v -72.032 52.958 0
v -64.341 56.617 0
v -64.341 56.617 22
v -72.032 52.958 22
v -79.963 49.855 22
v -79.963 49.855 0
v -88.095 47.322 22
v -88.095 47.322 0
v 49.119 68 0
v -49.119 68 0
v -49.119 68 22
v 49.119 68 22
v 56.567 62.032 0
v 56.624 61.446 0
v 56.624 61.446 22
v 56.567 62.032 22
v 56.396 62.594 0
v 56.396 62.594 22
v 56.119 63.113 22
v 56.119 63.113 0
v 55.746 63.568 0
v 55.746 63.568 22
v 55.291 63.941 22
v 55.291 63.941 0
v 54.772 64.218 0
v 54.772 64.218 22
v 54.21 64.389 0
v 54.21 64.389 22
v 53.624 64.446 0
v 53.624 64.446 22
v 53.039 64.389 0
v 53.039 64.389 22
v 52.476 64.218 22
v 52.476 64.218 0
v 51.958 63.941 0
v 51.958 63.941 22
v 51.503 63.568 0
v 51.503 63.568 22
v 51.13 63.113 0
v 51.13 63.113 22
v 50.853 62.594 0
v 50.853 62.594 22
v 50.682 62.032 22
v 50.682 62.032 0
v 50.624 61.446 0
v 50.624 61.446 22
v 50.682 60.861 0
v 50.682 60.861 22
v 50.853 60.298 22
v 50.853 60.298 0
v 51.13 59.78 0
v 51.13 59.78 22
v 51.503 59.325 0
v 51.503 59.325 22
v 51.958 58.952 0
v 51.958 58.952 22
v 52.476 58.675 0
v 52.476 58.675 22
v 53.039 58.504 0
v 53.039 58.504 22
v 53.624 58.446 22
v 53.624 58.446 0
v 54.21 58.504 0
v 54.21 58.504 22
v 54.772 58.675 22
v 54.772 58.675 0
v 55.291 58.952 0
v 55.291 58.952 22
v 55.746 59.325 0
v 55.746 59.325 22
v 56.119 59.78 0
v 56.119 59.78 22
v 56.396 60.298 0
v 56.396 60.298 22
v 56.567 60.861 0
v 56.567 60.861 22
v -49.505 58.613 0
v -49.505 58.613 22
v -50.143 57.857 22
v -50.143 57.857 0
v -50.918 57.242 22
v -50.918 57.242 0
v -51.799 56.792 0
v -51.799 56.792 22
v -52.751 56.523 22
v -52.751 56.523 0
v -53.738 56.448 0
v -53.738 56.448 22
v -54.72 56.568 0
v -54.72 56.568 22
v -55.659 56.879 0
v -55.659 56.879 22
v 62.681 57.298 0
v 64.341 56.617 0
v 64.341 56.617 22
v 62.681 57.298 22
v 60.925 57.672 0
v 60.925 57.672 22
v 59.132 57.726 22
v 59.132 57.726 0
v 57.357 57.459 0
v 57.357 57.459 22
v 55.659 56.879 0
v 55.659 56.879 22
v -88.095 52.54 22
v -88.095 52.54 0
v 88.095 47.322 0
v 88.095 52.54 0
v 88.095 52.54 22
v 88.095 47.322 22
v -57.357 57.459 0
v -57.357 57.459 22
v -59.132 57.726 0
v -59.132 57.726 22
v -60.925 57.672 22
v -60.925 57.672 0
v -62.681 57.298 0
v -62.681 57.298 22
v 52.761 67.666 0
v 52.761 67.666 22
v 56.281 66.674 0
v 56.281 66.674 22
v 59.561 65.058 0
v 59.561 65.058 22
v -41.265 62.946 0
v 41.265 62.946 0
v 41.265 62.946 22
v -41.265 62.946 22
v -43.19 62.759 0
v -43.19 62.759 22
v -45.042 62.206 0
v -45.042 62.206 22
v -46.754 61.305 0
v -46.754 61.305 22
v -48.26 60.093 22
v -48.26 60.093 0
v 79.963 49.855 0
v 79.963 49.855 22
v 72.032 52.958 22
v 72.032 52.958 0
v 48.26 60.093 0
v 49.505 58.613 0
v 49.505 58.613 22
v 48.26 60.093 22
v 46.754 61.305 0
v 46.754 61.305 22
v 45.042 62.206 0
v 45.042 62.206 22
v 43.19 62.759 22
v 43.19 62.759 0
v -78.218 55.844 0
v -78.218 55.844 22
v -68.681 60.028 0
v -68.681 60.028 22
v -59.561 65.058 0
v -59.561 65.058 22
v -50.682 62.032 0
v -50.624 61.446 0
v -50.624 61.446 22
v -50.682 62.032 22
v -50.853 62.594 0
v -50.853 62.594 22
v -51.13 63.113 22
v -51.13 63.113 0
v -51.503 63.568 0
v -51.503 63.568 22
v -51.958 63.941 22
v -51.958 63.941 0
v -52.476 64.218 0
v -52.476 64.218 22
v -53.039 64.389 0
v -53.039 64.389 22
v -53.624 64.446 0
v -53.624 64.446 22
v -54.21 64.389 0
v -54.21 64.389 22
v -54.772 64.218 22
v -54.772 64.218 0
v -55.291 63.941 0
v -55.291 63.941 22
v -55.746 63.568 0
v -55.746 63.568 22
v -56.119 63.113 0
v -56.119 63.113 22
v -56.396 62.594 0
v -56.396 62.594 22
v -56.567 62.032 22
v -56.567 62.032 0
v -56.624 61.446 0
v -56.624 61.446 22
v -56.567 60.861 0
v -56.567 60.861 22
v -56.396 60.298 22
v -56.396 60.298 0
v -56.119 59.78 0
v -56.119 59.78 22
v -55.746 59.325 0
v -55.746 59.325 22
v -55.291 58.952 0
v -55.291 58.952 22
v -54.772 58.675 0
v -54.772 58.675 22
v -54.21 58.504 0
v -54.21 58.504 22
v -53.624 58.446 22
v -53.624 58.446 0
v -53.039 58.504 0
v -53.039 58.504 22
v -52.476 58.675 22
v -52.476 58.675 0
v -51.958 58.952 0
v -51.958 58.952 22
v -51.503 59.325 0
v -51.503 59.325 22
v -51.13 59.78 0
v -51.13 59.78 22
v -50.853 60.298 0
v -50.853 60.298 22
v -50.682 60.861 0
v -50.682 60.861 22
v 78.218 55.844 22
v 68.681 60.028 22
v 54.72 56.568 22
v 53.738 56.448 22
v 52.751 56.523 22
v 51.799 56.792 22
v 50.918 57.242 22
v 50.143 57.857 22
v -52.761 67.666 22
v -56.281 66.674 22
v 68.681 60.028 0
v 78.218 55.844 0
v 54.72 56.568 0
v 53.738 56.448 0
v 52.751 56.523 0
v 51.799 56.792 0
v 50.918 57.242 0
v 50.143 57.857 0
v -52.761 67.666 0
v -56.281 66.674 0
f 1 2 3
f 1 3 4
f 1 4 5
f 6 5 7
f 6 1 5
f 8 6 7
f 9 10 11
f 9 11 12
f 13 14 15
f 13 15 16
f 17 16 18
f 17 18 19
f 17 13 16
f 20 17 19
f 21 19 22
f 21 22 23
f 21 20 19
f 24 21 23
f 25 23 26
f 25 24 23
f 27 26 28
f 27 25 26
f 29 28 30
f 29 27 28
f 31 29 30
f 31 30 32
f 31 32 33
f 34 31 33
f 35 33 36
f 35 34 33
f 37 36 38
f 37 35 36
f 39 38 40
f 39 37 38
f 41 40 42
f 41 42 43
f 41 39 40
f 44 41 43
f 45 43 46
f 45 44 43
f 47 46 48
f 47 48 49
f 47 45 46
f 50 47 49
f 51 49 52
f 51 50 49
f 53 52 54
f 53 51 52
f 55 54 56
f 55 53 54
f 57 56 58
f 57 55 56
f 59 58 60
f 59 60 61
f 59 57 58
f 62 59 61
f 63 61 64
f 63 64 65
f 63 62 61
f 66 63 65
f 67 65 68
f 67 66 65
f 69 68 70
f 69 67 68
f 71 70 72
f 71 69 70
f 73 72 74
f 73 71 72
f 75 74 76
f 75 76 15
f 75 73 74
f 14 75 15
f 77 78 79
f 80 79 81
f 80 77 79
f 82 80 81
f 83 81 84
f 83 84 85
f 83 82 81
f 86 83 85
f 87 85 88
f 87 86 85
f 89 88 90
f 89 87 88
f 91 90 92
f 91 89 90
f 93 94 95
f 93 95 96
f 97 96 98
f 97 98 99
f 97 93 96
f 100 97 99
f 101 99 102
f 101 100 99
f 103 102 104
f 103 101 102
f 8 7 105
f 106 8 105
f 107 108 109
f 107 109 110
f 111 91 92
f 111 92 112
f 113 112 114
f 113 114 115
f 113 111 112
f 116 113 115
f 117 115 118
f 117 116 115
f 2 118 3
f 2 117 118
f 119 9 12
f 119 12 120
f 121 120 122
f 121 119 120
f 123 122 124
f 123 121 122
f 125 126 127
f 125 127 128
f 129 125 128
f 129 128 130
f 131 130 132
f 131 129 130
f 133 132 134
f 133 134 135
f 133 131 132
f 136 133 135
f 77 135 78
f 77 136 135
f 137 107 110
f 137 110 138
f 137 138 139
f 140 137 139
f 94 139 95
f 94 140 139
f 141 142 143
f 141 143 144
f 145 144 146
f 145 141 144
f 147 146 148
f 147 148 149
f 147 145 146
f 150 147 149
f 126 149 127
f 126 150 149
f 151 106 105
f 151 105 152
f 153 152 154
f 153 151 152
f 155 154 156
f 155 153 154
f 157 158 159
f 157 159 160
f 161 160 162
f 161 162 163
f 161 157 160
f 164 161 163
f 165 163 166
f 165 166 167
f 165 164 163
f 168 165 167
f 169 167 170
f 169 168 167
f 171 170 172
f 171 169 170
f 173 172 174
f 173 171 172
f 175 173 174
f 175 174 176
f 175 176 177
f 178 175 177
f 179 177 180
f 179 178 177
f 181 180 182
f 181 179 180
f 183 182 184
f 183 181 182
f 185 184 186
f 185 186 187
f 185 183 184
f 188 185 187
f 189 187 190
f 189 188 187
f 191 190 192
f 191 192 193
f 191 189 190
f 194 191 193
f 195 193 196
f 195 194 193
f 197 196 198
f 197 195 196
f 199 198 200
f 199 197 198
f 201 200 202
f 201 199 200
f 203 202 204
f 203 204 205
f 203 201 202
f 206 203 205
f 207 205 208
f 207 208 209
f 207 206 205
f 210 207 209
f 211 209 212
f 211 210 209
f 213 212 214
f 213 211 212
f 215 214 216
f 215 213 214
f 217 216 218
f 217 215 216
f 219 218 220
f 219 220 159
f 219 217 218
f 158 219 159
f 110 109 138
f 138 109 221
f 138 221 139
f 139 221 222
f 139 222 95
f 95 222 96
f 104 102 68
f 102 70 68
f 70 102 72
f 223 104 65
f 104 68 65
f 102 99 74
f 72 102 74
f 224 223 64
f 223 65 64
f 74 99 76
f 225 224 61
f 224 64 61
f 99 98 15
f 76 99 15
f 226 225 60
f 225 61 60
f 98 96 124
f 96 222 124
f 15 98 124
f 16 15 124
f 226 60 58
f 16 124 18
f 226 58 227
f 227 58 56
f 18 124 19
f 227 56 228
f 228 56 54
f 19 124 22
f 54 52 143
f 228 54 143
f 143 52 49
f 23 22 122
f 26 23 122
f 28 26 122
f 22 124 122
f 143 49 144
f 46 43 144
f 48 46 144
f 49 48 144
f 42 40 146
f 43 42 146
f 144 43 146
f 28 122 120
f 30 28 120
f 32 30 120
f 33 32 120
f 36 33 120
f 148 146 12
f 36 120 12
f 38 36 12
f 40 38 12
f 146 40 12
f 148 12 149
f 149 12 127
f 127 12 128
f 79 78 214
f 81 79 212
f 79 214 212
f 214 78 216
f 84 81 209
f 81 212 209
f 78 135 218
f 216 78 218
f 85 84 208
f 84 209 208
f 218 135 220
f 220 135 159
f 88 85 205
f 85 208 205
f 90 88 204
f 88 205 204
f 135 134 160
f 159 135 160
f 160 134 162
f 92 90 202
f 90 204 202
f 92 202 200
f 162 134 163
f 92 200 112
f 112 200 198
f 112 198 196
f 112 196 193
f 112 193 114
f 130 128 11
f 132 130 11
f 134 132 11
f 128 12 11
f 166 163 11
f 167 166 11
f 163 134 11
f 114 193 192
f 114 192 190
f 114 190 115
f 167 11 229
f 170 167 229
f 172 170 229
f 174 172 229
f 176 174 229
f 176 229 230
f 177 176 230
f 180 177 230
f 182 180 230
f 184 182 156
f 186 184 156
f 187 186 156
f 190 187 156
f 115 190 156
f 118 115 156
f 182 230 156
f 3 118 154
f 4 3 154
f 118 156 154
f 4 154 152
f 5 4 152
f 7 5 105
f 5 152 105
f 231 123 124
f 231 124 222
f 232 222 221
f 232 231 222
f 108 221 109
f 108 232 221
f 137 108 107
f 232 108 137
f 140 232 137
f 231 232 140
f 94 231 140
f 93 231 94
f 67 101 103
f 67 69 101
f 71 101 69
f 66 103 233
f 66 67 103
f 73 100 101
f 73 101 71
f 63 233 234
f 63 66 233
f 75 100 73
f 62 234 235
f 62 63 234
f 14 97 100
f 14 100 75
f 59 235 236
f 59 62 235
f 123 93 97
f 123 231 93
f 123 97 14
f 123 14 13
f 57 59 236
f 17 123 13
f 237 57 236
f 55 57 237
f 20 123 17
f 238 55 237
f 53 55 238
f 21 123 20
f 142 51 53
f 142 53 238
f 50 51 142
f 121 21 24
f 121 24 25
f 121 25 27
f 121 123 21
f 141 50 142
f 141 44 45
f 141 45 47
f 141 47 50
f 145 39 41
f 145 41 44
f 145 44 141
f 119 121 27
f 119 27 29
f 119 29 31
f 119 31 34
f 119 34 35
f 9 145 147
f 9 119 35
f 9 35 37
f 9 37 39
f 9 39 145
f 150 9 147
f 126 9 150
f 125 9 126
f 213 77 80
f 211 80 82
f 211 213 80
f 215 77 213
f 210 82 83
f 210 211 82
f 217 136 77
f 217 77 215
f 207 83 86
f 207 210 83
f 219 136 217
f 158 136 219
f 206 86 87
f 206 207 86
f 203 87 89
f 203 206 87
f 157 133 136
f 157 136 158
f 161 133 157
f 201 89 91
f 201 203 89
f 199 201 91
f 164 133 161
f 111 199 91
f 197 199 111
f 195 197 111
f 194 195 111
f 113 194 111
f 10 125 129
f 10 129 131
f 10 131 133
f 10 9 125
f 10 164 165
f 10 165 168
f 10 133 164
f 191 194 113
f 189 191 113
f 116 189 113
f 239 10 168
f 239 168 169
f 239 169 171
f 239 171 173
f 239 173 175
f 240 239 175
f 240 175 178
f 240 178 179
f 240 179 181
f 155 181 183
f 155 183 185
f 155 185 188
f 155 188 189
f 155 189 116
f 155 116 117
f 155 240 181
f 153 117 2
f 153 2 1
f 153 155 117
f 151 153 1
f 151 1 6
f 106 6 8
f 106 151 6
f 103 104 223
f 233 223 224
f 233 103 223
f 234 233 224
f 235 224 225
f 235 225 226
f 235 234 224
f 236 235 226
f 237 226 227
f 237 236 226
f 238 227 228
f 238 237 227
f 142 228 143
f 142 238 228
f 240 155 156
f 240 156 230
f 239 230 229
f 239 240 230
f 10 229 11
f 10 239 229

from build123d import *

# Parameters (mm, degrees)
ESBO_O1_R                = 3
RESSALTO_EXTRUS_O1_DEPTH = 22


with BuildPart() as part:
    # Esboço1 → Ressalto-extrusão1 (new body)
    with BuildSketch(Plane.XY):
        with BuildLine():
            Line((-49.119135606, 68), (49.119135606, 68))
            ThreePointArc((49.119135606, 68), (54.543435225, 67.250375935), (59.56111629, 65.057697365))
            ThreePointArc((59.56111629, 65.057697365), (73.40190502, 57.827992781), (88.094517748, 52.539969306))
            Line((88.094517748, 52.539969306), (88.094517748, 47.321908149))
            ThreePointArc((88.094517748, 47.321908149), (75.969961031, 51.336342949), (64.340736461, 56.616655277))
            ThreePointArc((64.340736461, 56.616655277), (60.029722653, 57.739663923), (55.658771962, 56.878979006))
            ThreePointArc((55.658771962, 56.878979006), (52.268274515, 56.633748331), (49.504565952, 58.613022442))
            ThreePointArc((49.504565952, 58.613022442), (45.919841237, 61.796967806), (41.265094556, 62.946355775))
            Line((41.265094556, 62.946355775), (-41.265094556, 62.946355775))
            ThreePointArc((-41.265094556, 62.946355775), (-45.919841237, 61.796967806), (-49.504565952, 58.613022442))
            ThreePointArc((-49.504565952, 58.613022442), (-52.268274515, 56.633748331), (-55.658771962, 56.878979006))
            ThreePointArc((-55.658771962, 56.878979006), (-60.029722653, 57.739663923), (-64.340736461, 56.616655277))
            ThreePointArc((-64.340736461, 56.616655277), (-75.969961031, 51.336342949), (-88.094517748, 47.321908149))
            Line((-88.094517748, 47.321908149), (-88.094517748, 52.539969306))
            ThreePointArc((-88.094517748, 52.539969306), (-73.40190502, 57.827992781), (-59.56111629, 65.057697365))
            ThreePointArc((-59.56111629, 65.057697365), (-54.543435225, 67.250375935), (-49.119135606, 68))
        make_face()
        with Locations((-53.62430165, 61.446355775)):
            Circle(ESBO_O1_R, mode=Mode.SUBTRACT)
        with Locations((53.62430165, 61.446355775)):
            Circle(ESBO_O1_R, mode=Mode.SUBTRACT)
    extrude(amount=RESSALTO_EXTRUS_O1_DEPTH)


solid = part.part
